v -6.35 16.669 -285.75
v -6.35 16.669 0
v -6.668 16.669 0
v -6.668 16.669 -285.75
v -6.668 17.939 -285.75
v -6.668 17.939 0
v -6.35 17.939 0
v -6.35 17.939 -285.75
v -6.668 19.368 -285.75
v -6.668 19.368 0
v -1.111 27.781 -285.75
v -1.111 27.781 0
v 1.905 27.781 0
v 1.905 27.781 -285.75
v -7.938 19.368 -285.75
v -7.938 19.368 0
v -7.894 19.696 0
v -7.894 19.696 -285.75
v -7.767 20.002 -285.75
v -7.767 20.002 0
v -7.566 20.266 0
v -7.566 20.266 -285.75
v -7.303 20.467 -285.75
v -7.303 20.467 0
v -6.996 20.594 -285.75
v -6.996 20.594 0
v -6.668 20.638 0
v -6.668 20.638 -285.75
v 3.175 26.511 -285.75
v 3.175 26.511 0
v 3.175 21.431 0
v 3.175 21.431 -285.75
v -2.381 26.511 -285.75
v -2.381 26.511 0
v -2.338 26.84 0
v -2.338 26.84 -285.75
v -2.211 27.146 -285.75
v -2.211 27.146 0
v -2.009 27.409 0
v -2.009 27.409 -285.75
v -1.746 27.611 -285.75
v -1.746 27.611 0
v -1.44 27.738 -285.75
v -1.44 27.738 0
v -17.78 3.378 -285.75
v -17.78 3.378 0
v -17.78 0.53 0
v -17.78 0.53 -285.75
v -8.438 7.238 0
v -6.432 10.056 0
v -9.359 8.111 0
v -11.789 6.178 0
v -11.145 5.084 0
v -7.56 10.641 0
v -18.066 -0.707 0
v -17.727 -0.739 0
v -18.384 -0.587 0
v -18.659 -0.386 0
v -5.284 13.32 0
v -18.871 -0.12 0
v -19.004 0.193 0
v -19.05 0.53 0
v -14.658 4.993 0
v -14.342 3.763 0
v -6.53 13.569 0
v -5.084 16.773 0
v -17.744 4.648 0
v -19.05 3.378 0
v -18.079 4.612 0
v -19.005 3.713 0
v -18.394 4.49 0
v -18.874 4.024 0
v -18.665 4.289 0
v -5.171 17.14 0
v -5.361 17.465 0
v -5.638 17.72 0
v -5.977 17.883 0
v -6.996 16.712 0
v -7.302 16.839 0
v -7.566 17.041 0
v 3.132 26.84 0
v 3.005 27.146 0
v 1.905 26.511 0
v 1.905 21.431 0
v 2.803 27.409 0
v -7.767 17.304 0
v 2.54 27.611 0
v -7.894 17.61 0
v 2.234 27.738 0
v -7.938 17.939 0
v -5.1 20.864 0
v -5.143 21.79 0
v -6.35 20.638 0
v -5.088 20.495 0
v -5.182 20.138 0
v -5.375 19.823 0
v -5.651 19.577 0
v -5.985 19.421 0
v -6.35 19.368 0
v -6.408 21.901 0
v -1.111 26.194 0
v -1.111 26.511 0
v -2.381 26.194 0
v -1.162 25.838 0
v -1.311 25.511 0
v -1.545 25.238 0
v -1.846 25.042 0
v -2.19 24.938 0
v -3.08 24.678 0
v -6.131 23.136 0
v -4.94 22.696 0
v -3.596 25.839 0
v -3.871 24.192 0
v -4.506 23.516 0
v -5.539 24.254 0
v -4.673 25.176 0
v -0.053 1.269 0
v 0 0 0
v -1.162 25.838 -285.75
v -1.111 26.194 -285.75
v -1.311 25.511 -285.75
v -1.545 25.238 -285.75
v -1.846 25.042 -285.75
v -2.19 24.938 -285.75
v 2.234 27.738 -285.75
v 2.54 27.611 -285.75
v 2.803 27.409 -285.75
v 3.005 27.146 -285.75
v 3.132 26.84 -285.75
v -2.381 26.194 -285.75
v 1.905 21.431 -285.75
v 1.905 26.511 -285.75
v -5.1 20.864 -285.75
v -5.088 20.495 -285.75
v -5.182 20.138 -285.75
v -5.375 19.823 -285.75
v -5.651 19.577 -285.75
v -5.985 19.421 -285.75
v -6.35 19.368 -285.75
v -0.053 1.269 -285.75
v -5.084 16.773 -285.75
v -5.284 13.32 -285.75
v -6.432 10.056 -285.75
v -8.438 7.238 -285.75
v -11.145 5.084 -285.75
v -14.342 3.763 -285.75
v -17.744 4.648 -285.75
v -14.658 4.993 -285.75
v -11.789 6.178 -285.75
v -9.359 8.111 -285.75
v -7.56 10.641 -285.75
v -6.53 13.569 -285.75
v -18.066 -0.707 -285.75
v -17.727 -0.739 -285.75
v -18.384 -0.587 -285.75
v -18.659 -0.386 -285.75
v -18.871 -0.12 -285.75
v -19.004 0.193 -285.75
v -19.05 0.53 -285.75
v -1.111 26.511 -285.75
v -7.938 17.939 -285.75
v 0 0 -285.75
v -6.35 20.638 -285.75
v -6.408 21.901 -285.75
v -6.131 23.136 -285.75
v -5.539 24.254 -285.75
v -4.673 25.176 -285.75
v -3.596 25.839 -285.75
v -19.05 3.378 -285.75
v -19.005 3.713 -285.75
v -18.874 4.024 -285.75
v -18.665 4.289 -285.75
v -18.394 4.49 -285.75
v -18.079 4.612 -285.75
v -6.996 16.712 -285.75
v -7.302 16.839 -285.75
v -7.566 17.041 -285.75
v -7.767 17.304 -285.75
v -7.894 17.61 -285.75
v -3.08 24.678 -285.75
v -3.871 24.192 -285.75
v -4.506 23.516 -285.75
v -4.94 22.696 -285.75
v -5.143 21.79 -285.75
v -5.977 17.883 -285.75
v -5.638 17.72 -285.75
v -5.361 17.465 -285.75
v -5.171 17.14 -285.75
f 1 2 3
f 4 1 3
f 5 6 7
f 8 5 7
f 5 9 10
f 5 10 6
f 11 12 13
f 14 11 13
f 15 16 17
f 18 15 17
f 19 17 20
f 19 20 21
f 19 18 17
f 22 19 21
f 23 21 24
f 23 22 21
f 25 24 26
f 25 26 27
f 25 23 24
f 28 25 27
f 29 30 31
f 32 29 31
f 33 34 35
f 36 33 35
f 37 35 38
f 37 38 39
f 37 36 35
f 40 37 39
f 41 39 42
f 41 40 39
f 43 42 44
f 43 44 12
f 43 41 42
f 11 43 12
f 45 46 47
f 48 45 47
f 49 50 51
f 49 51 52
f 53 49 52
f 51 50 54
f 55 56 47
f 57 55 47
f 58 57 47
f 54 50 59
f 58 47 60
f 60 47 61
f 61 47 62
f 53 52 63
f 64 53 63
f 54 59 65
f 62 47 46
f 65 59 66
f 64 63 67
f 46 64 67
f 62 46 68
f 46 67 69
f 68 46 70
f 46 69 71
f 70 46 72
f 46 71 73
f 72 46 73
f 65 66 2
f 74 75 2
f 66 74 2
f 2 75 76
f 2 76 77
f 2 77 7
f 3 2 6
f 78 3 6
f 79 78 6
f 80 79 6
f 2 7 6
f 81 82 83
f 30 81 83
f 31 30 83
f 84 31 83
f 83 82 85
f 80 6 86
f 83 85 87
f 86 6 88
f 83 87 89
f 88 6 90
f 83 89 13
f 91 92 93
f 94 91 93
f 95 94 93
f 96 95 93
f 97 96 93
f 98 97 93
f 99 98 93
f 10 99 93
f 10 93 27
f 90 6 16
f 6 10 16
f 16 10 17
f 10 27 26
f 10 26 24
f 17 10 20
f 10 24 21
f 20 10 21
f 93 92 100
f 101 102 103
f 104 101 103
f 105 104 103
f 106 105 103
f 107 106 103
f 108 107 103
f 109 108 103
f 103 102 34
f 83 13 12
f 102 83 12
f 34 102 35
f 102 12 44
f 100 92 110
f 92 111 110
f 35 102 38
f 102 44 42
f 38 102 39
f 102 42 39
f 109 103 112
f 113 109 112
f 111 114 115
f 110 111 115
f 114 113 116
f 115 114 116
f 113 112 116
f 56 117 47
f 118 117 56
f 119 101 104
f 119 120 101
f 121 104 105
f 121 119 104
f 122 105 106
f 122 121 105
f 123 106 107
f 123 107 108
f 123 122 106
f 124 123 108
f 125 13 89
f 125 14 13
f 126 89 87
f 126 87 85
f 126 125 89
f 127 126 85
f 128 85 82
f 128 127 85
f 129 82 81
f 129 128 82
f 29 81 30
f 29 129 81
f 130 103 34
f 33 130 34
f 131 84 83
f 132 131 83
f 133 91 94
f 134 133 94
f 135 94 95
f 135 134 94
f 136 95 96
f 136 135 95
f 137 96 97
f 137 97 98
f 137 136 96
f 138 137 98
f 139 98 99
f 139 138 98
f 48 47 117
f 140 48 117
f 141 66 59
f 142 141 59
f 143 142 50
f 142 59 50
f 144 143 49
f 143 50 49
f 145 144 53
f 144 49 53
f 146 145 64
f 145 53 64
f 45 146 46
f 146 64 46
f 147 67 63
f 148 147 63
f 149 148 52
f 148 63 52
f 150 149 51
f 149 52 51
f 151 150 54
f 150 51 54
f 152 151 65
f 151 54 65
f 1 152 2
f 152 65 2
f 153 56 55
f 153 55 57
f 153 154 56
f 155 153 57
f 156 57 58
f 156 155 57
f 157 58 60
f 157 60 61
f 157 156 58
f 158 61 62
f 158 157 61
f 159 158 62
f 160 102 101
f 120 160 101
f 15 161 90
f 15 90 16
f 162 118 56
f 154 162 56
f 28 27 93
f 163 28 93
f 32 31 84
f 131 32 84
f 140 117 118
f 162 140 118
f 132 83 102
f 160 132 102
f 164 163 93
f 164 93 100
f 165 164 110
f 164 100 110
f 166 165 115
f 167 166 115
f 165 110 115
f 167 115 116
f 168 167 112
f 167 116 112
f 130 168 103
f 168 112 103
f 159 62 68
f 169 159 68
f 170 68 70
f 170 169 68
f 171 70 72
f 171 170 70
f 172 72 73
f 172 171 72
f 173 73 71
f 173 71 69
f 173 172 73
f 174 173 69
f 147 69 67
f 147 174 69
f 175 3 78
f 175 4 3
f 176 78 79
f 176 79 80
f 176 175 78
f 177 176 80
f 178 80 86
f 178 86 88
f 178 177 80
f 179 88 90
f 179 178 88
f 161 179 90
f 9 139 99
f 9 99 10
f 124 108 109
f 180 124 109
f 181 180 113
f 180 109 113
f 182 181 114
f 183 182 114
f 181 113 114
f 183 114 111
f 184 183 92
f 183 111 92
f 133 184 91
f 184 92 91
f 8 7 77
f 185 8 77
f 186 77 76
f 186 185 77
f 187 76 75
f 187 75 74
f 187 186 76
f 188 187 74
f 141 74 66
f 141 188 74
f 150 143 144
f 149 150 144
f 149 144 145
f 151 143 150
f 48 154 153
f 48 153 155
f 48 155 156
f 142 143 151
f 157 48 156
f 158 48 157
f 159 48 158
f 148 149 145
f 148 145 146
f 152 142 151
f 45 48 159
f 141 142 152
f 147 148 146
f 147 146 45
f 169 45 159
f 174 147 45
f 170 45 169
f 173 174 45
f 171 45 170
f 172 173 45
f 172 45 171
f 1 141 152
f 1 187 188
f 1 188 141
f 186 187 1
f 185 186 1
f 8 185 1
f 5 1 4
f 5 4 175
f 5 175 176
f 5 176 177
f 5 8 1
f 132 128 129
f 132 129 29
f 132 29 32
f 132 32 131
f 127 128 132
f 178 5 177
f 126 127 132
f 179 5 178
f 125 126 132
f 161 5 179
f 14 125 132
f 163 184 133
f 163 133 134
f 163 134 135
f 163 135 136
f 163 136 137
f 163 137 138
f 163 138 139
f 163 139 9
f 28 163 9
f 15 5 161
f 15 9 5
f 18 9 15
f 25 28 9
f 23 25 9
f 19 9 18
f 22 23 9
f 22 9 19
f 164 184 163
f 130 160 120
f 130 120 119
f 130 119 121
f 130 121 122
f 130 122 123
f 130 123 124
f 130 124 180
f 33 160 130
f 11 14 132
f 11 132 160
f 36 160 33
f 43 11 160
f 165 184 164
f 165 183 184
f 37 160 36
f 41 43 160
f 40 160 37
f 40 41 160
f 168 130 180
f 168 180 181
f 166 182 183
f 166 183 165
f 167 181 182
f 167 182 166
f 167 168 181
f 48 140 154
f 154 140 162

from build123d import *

# Parameters (mm, degrees)
EXTRUDE_THIN1_DEPTH = 285.75
FILLET1_R           = 1.27


with BuildPart() as part:
    # Sketch1 → Extrude-Thin1 (new body)
    with BuildSketch(Plane.XY):
        with BuildLine():
            Line((0, 0), (-19.05, -0.79375))
            Line((-19.05, -0.79375), (-19.05, 4.7625))
            ThreePointArc((-19.05, 4.7625), (-9.824616787, 7.648549572), (-6.35, 16.66875))
            Line((-6.35, 16.66875), (-7.9375, 16.66875))
            Line((-7.9375, 16.66875), (-7.9375, 20.6375))
            Line((-7.9375, 20.6375), (-6.35, 20.6375))
            ThreePointArc((-6.35, 20.6375), (-5.539033157, 24.253773684), (-2.38125, 26.19375))
            Line((-2.38125, 26.19375), (-2.38125, 27.78125))
            Line((-2.38125, 27.78125), (3.175, 27.78125))
            Line((3.175, 27.78125), (3.175, 21.43125))
            Line((3.175, 21.43125), (1.905, 21.43125))
            Line((1.905, 21.43125), (1.905, 26.51125))
            Line((1.905, 26.51125), (-1.11125, 26.51125))
            Line((-1.11125, 26.51125), (-1.11125, 24.934167832))
            ThreePointArc((-1.11125, 24.934167832), (-4.660969167, 23.278250334), (-4.440513376, 19.3675))
            Line((-4.440513376, 19.3675), (-6.6675, 19.3675))
            Line((-6.6675, 19.3675), (-6.6675, 17.93875))
            Line((-6.6675, 17.93875), (-5.236398958, 17.93875))
            ThreePointArc((-5.236398958, 17.93875), (-8.043524077, 7.673709188), (-17.78, 3.378124142))
            Line((-17.78, 3.378124142), (-17.78, 0.530268619))
            Line((-17.78, 0.530268619), (-0.052870792, 1.268899003))
            Line((-0.052870792, 1.268899003), (0, 0))
        make_face()
    extrude(amount=-EXTRUDE_THIN1_DEPTH)

    # Fillet1
    fillet1_edges = [part.edges().sort_by_distance(p)[0] for p in [
        (-1.11125, 24.934167832, -142.875),
        (-4.440513376, 19.3675, -142.875),
        (-5.236398958, 17.93875, -142.875),
        (-19.05, -0.79375, -142.875),
        (-19.05, 4.7625, -142.875),
        (-7.9375, 16.66875, -142.875),
        (-7.9375, 20.6375, -142.875),
        (-2.38125, 27.78125, -142.875),
        (3.175, 27.78125, -142.875),
    ]]
    fillet(fillet1_edges, radius=FILLET1_R)


solid = part.part
